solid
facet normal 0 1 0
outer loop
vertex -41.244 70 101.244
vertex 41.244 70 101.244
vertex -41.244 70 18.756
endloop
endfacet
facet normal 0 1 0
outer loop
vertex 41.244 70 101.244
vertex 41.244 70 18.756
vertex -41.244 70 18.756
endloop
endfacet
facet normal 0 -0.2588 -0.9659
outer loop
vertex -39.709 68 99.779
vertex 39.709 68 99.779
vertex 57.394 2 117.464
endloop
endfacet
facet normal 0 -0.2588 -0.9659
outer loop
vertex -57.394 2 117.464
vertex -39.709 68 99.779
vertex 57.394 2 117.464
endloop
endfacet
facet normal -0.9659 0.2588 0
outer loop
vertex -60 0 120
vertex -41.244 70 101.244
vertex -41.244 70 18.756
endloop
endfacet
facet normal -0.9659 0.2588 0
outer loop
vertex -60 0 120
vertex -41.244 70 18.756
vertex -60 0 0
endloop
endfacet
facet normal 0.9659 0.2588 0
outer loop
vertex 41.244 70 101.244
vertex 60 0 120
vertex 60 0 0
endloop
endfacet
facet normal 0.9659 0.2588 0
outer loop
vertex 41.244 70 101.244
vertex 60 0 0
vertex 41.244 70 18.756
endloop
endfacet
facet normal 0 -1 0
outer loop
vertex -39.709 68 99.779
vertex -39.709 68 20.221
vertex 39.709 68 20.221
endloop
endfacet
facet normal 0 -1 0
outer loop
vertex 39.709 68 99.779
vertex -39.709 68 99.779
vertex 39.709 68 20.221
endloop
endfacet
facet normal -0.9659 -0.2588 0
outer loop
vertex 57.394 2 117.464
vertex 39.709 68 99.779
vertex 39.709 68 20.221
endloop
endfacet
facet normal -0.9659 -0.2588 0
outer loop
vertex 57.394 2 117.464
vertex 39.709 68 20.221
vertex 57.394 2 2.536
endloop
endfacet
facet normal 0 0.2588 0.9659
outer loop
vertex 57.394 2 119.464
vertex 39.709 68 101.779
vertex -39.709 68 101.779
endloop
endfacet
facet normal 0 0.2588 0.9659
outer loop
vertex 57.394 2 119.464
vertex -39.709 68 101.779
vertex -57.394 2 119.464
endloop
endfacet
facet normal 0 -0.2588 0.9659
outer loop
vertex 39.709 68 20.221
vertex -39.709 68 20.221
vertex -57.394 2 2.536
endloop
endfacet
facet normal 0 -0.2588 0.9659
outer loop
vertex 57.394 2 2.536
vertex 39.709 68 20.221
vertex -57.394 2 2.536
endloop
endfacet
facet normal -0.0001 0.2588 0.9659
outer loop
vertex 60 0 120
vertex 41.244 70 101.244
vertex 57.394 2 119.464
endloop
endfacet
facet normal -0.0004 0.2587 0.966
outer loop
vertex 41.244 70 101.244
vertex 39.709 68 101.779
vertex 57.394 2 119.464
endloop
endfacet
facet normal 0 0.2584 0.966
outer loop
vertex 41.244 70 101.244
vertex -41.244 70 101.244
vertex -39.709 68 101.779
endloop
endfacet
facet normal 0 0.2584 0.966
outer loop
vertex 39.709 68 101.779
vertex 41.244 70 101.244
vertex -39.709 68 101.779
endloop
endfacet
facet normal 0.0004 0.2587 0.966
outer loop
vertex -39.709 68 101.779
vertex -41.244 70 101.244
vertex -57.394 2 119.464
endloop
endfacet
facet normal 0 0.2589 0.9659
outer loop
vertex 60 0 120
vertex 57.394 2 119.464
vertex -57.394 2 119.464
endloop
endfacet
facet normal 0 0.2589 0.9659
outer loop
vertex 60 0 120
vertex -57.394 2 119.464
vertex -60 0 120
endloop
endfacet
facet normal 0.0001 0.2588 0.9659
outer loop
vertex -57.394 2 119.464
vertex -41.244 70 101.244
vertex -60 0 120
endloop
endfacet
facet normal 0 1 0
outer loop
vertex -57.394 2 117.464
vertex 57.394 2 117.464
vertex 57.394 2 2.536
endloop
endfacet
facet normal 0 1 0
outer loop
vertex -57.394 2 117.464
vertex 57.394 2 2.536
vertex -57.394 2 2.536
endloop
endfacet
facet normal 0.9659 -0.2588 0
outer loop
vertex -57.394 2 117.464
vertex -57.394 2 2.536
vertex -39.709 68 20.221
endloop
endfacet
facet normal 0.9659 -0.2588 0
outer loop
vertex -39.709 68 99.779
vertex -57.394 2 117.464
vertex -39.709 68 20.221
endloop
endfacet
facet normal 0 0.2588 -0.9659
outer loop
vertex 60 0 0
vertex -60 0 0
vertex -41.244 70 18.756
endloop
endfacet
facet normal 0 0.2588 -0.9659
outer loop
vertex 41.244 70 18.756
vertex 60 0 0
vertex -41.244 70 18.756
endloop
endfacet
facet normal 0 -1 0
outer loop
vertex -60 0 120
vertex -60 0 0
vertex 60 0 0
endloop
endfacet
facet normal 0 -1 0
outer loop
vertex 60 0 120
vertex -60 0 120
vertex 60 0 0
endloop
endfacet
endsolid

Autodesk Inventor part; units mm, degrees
ref_plane "YZ Plane" through (0, 0, 0) normal (1, 0, 0) x (0, 1, 0)
ref_plane "XZ Plane" through (0, 0, 0) normal (0, 1, 0) x (-1, 0, 0)
ref_plane "XY Plane" through (0, 0, 0) normal (0, 0, 1) x (1, 0, 0)
sketch "Эскиз1" plane through (0, 0, 0) normal (0, 0, 1) x (1, 0, 0)
  line L0 (-60, 0) -> (60, 0)
  line L1 (60, 0) -> (41.2436, 70)
  line L2 (41.2436, 70) -> (-41.2436, 70)
  line L3 (-41.2436, 70) -> (-60, 0)
  line L4 (0, 70) -> (0, 0)
  line L5 (-57.3935, 2) -> (-39.7089, 68)
  line L6 (-39.7089, 68) -> (39.7089, 68)
  line L7 (39.7089, 68) -> (57.3935, 2)
  line L8 (57.3935, 2) -> (-57.3935, 2)
  dimension "d0" = 70
  dimension "d1" = 120
  dimension "d2" = 75
  dimension "d8" = 2
  dimension "d9" = 2
  dimension "d10" = 2
  dimension "d11" = 2
  dimension "d12" = 0
extrude "Выдавливание1" add sketch "Эскиз1" along normal blind 120 contours L3 L2 L4 L6 L5 L8 L0 | L4 L8 L7 L6 L2 L1 L0
sketch "Эскиз2" plane through (0, 0, 0) normal (1, 0, 0) x (0, 1, 0)
  line L0 (0, 0) -> (0, 120) projected
  line L1 (0, 0) -> (70, 18.7564)
  line L2 (70, 0) -> (70, 120) projected
  line L3 (70, 18.7564) -> (70, 101.2436)
  line L4 (70, 0) -> (70, 120) projected
  line L5 (70, 120) -> (0, 120) projected
  line L6 (70, 101.2436) -> (0, 120)
  line L7 (0, 120) -> (0, 0)
  line L8 (70, 60) -> (0, 60)
  dimension "d5" = 75
extrude "Выдавливание2" cut sketch "Эскиз2" along normal mid plane 1000 contours L0 L8 L2 L1 | L0 L6 L2 L8 keep common part
sketch "Эскиз3" plane through (0, 0, 0) normal (1, 0, 0) x (0, 1, 0)
  line L0 (0, 0) -> (0, 120) projected
  line L1 (70, 18.7564) -> (70, 101.2436) projected
  line L2 (0, 0) -> (70, 18.7564)
  line L3 (70, 18.7564) -> (70, 20.7564)
  line L4 (70, 20.7564) -> (0, 2)
  line L5 (70, 18.7564) -> (0, 0) projected
  line L6 (0, 2) -> (0, 0)
  line L7 (0, 120) -> (70, 101.2436)
  line L8 (68, 101.7795) -> (2, 119.4641) projected
  line L9 (70, 101.2436) -> (70, 99.2436)
  line L10 (70, 99.2436) -> (0, 118)
  line L11 (0, 120) -> (0, 118)
  point P0 (0, 2)
  dimension "d13" = 2
  dimension "d14" = 2
extrude "Выдавливание3" add sketch "Эскиз3" along normal mid plane 120 contours L0 L4 L1 L2 | L0 L7 L1 L10
sketch "Эскиз4" plane through (0, 0, 0) normal (0, 0, 1) x (1, 0, 0)
  line L0 (60, 70) -> (60, 0) projected
  line L1 (60, 0) -> (41.2436, 70)
  line L2 (60, 70) -> (-60, 70) projected
  line L3 (-41.2436, 70) -> (-60, 0) projected
  line L4 (41.2436, 70) -> (-41.2436, 70)
  line L5 (-41.2436, 70) -> (-60, 0)
  line L6 (-60, 0) -> (60, 0) projected
  line L7 (-60, 0) -> (60, 0)
  line L8 (60, 0) -> (41.2436, 70) projected
  point P0 (0, 0)
  dimension "d19" = 0
extrude "Выдавливание4" cut sketch "Эскиз4" along normal blind 120 contours L6 L3 L2 L1 keep common part
